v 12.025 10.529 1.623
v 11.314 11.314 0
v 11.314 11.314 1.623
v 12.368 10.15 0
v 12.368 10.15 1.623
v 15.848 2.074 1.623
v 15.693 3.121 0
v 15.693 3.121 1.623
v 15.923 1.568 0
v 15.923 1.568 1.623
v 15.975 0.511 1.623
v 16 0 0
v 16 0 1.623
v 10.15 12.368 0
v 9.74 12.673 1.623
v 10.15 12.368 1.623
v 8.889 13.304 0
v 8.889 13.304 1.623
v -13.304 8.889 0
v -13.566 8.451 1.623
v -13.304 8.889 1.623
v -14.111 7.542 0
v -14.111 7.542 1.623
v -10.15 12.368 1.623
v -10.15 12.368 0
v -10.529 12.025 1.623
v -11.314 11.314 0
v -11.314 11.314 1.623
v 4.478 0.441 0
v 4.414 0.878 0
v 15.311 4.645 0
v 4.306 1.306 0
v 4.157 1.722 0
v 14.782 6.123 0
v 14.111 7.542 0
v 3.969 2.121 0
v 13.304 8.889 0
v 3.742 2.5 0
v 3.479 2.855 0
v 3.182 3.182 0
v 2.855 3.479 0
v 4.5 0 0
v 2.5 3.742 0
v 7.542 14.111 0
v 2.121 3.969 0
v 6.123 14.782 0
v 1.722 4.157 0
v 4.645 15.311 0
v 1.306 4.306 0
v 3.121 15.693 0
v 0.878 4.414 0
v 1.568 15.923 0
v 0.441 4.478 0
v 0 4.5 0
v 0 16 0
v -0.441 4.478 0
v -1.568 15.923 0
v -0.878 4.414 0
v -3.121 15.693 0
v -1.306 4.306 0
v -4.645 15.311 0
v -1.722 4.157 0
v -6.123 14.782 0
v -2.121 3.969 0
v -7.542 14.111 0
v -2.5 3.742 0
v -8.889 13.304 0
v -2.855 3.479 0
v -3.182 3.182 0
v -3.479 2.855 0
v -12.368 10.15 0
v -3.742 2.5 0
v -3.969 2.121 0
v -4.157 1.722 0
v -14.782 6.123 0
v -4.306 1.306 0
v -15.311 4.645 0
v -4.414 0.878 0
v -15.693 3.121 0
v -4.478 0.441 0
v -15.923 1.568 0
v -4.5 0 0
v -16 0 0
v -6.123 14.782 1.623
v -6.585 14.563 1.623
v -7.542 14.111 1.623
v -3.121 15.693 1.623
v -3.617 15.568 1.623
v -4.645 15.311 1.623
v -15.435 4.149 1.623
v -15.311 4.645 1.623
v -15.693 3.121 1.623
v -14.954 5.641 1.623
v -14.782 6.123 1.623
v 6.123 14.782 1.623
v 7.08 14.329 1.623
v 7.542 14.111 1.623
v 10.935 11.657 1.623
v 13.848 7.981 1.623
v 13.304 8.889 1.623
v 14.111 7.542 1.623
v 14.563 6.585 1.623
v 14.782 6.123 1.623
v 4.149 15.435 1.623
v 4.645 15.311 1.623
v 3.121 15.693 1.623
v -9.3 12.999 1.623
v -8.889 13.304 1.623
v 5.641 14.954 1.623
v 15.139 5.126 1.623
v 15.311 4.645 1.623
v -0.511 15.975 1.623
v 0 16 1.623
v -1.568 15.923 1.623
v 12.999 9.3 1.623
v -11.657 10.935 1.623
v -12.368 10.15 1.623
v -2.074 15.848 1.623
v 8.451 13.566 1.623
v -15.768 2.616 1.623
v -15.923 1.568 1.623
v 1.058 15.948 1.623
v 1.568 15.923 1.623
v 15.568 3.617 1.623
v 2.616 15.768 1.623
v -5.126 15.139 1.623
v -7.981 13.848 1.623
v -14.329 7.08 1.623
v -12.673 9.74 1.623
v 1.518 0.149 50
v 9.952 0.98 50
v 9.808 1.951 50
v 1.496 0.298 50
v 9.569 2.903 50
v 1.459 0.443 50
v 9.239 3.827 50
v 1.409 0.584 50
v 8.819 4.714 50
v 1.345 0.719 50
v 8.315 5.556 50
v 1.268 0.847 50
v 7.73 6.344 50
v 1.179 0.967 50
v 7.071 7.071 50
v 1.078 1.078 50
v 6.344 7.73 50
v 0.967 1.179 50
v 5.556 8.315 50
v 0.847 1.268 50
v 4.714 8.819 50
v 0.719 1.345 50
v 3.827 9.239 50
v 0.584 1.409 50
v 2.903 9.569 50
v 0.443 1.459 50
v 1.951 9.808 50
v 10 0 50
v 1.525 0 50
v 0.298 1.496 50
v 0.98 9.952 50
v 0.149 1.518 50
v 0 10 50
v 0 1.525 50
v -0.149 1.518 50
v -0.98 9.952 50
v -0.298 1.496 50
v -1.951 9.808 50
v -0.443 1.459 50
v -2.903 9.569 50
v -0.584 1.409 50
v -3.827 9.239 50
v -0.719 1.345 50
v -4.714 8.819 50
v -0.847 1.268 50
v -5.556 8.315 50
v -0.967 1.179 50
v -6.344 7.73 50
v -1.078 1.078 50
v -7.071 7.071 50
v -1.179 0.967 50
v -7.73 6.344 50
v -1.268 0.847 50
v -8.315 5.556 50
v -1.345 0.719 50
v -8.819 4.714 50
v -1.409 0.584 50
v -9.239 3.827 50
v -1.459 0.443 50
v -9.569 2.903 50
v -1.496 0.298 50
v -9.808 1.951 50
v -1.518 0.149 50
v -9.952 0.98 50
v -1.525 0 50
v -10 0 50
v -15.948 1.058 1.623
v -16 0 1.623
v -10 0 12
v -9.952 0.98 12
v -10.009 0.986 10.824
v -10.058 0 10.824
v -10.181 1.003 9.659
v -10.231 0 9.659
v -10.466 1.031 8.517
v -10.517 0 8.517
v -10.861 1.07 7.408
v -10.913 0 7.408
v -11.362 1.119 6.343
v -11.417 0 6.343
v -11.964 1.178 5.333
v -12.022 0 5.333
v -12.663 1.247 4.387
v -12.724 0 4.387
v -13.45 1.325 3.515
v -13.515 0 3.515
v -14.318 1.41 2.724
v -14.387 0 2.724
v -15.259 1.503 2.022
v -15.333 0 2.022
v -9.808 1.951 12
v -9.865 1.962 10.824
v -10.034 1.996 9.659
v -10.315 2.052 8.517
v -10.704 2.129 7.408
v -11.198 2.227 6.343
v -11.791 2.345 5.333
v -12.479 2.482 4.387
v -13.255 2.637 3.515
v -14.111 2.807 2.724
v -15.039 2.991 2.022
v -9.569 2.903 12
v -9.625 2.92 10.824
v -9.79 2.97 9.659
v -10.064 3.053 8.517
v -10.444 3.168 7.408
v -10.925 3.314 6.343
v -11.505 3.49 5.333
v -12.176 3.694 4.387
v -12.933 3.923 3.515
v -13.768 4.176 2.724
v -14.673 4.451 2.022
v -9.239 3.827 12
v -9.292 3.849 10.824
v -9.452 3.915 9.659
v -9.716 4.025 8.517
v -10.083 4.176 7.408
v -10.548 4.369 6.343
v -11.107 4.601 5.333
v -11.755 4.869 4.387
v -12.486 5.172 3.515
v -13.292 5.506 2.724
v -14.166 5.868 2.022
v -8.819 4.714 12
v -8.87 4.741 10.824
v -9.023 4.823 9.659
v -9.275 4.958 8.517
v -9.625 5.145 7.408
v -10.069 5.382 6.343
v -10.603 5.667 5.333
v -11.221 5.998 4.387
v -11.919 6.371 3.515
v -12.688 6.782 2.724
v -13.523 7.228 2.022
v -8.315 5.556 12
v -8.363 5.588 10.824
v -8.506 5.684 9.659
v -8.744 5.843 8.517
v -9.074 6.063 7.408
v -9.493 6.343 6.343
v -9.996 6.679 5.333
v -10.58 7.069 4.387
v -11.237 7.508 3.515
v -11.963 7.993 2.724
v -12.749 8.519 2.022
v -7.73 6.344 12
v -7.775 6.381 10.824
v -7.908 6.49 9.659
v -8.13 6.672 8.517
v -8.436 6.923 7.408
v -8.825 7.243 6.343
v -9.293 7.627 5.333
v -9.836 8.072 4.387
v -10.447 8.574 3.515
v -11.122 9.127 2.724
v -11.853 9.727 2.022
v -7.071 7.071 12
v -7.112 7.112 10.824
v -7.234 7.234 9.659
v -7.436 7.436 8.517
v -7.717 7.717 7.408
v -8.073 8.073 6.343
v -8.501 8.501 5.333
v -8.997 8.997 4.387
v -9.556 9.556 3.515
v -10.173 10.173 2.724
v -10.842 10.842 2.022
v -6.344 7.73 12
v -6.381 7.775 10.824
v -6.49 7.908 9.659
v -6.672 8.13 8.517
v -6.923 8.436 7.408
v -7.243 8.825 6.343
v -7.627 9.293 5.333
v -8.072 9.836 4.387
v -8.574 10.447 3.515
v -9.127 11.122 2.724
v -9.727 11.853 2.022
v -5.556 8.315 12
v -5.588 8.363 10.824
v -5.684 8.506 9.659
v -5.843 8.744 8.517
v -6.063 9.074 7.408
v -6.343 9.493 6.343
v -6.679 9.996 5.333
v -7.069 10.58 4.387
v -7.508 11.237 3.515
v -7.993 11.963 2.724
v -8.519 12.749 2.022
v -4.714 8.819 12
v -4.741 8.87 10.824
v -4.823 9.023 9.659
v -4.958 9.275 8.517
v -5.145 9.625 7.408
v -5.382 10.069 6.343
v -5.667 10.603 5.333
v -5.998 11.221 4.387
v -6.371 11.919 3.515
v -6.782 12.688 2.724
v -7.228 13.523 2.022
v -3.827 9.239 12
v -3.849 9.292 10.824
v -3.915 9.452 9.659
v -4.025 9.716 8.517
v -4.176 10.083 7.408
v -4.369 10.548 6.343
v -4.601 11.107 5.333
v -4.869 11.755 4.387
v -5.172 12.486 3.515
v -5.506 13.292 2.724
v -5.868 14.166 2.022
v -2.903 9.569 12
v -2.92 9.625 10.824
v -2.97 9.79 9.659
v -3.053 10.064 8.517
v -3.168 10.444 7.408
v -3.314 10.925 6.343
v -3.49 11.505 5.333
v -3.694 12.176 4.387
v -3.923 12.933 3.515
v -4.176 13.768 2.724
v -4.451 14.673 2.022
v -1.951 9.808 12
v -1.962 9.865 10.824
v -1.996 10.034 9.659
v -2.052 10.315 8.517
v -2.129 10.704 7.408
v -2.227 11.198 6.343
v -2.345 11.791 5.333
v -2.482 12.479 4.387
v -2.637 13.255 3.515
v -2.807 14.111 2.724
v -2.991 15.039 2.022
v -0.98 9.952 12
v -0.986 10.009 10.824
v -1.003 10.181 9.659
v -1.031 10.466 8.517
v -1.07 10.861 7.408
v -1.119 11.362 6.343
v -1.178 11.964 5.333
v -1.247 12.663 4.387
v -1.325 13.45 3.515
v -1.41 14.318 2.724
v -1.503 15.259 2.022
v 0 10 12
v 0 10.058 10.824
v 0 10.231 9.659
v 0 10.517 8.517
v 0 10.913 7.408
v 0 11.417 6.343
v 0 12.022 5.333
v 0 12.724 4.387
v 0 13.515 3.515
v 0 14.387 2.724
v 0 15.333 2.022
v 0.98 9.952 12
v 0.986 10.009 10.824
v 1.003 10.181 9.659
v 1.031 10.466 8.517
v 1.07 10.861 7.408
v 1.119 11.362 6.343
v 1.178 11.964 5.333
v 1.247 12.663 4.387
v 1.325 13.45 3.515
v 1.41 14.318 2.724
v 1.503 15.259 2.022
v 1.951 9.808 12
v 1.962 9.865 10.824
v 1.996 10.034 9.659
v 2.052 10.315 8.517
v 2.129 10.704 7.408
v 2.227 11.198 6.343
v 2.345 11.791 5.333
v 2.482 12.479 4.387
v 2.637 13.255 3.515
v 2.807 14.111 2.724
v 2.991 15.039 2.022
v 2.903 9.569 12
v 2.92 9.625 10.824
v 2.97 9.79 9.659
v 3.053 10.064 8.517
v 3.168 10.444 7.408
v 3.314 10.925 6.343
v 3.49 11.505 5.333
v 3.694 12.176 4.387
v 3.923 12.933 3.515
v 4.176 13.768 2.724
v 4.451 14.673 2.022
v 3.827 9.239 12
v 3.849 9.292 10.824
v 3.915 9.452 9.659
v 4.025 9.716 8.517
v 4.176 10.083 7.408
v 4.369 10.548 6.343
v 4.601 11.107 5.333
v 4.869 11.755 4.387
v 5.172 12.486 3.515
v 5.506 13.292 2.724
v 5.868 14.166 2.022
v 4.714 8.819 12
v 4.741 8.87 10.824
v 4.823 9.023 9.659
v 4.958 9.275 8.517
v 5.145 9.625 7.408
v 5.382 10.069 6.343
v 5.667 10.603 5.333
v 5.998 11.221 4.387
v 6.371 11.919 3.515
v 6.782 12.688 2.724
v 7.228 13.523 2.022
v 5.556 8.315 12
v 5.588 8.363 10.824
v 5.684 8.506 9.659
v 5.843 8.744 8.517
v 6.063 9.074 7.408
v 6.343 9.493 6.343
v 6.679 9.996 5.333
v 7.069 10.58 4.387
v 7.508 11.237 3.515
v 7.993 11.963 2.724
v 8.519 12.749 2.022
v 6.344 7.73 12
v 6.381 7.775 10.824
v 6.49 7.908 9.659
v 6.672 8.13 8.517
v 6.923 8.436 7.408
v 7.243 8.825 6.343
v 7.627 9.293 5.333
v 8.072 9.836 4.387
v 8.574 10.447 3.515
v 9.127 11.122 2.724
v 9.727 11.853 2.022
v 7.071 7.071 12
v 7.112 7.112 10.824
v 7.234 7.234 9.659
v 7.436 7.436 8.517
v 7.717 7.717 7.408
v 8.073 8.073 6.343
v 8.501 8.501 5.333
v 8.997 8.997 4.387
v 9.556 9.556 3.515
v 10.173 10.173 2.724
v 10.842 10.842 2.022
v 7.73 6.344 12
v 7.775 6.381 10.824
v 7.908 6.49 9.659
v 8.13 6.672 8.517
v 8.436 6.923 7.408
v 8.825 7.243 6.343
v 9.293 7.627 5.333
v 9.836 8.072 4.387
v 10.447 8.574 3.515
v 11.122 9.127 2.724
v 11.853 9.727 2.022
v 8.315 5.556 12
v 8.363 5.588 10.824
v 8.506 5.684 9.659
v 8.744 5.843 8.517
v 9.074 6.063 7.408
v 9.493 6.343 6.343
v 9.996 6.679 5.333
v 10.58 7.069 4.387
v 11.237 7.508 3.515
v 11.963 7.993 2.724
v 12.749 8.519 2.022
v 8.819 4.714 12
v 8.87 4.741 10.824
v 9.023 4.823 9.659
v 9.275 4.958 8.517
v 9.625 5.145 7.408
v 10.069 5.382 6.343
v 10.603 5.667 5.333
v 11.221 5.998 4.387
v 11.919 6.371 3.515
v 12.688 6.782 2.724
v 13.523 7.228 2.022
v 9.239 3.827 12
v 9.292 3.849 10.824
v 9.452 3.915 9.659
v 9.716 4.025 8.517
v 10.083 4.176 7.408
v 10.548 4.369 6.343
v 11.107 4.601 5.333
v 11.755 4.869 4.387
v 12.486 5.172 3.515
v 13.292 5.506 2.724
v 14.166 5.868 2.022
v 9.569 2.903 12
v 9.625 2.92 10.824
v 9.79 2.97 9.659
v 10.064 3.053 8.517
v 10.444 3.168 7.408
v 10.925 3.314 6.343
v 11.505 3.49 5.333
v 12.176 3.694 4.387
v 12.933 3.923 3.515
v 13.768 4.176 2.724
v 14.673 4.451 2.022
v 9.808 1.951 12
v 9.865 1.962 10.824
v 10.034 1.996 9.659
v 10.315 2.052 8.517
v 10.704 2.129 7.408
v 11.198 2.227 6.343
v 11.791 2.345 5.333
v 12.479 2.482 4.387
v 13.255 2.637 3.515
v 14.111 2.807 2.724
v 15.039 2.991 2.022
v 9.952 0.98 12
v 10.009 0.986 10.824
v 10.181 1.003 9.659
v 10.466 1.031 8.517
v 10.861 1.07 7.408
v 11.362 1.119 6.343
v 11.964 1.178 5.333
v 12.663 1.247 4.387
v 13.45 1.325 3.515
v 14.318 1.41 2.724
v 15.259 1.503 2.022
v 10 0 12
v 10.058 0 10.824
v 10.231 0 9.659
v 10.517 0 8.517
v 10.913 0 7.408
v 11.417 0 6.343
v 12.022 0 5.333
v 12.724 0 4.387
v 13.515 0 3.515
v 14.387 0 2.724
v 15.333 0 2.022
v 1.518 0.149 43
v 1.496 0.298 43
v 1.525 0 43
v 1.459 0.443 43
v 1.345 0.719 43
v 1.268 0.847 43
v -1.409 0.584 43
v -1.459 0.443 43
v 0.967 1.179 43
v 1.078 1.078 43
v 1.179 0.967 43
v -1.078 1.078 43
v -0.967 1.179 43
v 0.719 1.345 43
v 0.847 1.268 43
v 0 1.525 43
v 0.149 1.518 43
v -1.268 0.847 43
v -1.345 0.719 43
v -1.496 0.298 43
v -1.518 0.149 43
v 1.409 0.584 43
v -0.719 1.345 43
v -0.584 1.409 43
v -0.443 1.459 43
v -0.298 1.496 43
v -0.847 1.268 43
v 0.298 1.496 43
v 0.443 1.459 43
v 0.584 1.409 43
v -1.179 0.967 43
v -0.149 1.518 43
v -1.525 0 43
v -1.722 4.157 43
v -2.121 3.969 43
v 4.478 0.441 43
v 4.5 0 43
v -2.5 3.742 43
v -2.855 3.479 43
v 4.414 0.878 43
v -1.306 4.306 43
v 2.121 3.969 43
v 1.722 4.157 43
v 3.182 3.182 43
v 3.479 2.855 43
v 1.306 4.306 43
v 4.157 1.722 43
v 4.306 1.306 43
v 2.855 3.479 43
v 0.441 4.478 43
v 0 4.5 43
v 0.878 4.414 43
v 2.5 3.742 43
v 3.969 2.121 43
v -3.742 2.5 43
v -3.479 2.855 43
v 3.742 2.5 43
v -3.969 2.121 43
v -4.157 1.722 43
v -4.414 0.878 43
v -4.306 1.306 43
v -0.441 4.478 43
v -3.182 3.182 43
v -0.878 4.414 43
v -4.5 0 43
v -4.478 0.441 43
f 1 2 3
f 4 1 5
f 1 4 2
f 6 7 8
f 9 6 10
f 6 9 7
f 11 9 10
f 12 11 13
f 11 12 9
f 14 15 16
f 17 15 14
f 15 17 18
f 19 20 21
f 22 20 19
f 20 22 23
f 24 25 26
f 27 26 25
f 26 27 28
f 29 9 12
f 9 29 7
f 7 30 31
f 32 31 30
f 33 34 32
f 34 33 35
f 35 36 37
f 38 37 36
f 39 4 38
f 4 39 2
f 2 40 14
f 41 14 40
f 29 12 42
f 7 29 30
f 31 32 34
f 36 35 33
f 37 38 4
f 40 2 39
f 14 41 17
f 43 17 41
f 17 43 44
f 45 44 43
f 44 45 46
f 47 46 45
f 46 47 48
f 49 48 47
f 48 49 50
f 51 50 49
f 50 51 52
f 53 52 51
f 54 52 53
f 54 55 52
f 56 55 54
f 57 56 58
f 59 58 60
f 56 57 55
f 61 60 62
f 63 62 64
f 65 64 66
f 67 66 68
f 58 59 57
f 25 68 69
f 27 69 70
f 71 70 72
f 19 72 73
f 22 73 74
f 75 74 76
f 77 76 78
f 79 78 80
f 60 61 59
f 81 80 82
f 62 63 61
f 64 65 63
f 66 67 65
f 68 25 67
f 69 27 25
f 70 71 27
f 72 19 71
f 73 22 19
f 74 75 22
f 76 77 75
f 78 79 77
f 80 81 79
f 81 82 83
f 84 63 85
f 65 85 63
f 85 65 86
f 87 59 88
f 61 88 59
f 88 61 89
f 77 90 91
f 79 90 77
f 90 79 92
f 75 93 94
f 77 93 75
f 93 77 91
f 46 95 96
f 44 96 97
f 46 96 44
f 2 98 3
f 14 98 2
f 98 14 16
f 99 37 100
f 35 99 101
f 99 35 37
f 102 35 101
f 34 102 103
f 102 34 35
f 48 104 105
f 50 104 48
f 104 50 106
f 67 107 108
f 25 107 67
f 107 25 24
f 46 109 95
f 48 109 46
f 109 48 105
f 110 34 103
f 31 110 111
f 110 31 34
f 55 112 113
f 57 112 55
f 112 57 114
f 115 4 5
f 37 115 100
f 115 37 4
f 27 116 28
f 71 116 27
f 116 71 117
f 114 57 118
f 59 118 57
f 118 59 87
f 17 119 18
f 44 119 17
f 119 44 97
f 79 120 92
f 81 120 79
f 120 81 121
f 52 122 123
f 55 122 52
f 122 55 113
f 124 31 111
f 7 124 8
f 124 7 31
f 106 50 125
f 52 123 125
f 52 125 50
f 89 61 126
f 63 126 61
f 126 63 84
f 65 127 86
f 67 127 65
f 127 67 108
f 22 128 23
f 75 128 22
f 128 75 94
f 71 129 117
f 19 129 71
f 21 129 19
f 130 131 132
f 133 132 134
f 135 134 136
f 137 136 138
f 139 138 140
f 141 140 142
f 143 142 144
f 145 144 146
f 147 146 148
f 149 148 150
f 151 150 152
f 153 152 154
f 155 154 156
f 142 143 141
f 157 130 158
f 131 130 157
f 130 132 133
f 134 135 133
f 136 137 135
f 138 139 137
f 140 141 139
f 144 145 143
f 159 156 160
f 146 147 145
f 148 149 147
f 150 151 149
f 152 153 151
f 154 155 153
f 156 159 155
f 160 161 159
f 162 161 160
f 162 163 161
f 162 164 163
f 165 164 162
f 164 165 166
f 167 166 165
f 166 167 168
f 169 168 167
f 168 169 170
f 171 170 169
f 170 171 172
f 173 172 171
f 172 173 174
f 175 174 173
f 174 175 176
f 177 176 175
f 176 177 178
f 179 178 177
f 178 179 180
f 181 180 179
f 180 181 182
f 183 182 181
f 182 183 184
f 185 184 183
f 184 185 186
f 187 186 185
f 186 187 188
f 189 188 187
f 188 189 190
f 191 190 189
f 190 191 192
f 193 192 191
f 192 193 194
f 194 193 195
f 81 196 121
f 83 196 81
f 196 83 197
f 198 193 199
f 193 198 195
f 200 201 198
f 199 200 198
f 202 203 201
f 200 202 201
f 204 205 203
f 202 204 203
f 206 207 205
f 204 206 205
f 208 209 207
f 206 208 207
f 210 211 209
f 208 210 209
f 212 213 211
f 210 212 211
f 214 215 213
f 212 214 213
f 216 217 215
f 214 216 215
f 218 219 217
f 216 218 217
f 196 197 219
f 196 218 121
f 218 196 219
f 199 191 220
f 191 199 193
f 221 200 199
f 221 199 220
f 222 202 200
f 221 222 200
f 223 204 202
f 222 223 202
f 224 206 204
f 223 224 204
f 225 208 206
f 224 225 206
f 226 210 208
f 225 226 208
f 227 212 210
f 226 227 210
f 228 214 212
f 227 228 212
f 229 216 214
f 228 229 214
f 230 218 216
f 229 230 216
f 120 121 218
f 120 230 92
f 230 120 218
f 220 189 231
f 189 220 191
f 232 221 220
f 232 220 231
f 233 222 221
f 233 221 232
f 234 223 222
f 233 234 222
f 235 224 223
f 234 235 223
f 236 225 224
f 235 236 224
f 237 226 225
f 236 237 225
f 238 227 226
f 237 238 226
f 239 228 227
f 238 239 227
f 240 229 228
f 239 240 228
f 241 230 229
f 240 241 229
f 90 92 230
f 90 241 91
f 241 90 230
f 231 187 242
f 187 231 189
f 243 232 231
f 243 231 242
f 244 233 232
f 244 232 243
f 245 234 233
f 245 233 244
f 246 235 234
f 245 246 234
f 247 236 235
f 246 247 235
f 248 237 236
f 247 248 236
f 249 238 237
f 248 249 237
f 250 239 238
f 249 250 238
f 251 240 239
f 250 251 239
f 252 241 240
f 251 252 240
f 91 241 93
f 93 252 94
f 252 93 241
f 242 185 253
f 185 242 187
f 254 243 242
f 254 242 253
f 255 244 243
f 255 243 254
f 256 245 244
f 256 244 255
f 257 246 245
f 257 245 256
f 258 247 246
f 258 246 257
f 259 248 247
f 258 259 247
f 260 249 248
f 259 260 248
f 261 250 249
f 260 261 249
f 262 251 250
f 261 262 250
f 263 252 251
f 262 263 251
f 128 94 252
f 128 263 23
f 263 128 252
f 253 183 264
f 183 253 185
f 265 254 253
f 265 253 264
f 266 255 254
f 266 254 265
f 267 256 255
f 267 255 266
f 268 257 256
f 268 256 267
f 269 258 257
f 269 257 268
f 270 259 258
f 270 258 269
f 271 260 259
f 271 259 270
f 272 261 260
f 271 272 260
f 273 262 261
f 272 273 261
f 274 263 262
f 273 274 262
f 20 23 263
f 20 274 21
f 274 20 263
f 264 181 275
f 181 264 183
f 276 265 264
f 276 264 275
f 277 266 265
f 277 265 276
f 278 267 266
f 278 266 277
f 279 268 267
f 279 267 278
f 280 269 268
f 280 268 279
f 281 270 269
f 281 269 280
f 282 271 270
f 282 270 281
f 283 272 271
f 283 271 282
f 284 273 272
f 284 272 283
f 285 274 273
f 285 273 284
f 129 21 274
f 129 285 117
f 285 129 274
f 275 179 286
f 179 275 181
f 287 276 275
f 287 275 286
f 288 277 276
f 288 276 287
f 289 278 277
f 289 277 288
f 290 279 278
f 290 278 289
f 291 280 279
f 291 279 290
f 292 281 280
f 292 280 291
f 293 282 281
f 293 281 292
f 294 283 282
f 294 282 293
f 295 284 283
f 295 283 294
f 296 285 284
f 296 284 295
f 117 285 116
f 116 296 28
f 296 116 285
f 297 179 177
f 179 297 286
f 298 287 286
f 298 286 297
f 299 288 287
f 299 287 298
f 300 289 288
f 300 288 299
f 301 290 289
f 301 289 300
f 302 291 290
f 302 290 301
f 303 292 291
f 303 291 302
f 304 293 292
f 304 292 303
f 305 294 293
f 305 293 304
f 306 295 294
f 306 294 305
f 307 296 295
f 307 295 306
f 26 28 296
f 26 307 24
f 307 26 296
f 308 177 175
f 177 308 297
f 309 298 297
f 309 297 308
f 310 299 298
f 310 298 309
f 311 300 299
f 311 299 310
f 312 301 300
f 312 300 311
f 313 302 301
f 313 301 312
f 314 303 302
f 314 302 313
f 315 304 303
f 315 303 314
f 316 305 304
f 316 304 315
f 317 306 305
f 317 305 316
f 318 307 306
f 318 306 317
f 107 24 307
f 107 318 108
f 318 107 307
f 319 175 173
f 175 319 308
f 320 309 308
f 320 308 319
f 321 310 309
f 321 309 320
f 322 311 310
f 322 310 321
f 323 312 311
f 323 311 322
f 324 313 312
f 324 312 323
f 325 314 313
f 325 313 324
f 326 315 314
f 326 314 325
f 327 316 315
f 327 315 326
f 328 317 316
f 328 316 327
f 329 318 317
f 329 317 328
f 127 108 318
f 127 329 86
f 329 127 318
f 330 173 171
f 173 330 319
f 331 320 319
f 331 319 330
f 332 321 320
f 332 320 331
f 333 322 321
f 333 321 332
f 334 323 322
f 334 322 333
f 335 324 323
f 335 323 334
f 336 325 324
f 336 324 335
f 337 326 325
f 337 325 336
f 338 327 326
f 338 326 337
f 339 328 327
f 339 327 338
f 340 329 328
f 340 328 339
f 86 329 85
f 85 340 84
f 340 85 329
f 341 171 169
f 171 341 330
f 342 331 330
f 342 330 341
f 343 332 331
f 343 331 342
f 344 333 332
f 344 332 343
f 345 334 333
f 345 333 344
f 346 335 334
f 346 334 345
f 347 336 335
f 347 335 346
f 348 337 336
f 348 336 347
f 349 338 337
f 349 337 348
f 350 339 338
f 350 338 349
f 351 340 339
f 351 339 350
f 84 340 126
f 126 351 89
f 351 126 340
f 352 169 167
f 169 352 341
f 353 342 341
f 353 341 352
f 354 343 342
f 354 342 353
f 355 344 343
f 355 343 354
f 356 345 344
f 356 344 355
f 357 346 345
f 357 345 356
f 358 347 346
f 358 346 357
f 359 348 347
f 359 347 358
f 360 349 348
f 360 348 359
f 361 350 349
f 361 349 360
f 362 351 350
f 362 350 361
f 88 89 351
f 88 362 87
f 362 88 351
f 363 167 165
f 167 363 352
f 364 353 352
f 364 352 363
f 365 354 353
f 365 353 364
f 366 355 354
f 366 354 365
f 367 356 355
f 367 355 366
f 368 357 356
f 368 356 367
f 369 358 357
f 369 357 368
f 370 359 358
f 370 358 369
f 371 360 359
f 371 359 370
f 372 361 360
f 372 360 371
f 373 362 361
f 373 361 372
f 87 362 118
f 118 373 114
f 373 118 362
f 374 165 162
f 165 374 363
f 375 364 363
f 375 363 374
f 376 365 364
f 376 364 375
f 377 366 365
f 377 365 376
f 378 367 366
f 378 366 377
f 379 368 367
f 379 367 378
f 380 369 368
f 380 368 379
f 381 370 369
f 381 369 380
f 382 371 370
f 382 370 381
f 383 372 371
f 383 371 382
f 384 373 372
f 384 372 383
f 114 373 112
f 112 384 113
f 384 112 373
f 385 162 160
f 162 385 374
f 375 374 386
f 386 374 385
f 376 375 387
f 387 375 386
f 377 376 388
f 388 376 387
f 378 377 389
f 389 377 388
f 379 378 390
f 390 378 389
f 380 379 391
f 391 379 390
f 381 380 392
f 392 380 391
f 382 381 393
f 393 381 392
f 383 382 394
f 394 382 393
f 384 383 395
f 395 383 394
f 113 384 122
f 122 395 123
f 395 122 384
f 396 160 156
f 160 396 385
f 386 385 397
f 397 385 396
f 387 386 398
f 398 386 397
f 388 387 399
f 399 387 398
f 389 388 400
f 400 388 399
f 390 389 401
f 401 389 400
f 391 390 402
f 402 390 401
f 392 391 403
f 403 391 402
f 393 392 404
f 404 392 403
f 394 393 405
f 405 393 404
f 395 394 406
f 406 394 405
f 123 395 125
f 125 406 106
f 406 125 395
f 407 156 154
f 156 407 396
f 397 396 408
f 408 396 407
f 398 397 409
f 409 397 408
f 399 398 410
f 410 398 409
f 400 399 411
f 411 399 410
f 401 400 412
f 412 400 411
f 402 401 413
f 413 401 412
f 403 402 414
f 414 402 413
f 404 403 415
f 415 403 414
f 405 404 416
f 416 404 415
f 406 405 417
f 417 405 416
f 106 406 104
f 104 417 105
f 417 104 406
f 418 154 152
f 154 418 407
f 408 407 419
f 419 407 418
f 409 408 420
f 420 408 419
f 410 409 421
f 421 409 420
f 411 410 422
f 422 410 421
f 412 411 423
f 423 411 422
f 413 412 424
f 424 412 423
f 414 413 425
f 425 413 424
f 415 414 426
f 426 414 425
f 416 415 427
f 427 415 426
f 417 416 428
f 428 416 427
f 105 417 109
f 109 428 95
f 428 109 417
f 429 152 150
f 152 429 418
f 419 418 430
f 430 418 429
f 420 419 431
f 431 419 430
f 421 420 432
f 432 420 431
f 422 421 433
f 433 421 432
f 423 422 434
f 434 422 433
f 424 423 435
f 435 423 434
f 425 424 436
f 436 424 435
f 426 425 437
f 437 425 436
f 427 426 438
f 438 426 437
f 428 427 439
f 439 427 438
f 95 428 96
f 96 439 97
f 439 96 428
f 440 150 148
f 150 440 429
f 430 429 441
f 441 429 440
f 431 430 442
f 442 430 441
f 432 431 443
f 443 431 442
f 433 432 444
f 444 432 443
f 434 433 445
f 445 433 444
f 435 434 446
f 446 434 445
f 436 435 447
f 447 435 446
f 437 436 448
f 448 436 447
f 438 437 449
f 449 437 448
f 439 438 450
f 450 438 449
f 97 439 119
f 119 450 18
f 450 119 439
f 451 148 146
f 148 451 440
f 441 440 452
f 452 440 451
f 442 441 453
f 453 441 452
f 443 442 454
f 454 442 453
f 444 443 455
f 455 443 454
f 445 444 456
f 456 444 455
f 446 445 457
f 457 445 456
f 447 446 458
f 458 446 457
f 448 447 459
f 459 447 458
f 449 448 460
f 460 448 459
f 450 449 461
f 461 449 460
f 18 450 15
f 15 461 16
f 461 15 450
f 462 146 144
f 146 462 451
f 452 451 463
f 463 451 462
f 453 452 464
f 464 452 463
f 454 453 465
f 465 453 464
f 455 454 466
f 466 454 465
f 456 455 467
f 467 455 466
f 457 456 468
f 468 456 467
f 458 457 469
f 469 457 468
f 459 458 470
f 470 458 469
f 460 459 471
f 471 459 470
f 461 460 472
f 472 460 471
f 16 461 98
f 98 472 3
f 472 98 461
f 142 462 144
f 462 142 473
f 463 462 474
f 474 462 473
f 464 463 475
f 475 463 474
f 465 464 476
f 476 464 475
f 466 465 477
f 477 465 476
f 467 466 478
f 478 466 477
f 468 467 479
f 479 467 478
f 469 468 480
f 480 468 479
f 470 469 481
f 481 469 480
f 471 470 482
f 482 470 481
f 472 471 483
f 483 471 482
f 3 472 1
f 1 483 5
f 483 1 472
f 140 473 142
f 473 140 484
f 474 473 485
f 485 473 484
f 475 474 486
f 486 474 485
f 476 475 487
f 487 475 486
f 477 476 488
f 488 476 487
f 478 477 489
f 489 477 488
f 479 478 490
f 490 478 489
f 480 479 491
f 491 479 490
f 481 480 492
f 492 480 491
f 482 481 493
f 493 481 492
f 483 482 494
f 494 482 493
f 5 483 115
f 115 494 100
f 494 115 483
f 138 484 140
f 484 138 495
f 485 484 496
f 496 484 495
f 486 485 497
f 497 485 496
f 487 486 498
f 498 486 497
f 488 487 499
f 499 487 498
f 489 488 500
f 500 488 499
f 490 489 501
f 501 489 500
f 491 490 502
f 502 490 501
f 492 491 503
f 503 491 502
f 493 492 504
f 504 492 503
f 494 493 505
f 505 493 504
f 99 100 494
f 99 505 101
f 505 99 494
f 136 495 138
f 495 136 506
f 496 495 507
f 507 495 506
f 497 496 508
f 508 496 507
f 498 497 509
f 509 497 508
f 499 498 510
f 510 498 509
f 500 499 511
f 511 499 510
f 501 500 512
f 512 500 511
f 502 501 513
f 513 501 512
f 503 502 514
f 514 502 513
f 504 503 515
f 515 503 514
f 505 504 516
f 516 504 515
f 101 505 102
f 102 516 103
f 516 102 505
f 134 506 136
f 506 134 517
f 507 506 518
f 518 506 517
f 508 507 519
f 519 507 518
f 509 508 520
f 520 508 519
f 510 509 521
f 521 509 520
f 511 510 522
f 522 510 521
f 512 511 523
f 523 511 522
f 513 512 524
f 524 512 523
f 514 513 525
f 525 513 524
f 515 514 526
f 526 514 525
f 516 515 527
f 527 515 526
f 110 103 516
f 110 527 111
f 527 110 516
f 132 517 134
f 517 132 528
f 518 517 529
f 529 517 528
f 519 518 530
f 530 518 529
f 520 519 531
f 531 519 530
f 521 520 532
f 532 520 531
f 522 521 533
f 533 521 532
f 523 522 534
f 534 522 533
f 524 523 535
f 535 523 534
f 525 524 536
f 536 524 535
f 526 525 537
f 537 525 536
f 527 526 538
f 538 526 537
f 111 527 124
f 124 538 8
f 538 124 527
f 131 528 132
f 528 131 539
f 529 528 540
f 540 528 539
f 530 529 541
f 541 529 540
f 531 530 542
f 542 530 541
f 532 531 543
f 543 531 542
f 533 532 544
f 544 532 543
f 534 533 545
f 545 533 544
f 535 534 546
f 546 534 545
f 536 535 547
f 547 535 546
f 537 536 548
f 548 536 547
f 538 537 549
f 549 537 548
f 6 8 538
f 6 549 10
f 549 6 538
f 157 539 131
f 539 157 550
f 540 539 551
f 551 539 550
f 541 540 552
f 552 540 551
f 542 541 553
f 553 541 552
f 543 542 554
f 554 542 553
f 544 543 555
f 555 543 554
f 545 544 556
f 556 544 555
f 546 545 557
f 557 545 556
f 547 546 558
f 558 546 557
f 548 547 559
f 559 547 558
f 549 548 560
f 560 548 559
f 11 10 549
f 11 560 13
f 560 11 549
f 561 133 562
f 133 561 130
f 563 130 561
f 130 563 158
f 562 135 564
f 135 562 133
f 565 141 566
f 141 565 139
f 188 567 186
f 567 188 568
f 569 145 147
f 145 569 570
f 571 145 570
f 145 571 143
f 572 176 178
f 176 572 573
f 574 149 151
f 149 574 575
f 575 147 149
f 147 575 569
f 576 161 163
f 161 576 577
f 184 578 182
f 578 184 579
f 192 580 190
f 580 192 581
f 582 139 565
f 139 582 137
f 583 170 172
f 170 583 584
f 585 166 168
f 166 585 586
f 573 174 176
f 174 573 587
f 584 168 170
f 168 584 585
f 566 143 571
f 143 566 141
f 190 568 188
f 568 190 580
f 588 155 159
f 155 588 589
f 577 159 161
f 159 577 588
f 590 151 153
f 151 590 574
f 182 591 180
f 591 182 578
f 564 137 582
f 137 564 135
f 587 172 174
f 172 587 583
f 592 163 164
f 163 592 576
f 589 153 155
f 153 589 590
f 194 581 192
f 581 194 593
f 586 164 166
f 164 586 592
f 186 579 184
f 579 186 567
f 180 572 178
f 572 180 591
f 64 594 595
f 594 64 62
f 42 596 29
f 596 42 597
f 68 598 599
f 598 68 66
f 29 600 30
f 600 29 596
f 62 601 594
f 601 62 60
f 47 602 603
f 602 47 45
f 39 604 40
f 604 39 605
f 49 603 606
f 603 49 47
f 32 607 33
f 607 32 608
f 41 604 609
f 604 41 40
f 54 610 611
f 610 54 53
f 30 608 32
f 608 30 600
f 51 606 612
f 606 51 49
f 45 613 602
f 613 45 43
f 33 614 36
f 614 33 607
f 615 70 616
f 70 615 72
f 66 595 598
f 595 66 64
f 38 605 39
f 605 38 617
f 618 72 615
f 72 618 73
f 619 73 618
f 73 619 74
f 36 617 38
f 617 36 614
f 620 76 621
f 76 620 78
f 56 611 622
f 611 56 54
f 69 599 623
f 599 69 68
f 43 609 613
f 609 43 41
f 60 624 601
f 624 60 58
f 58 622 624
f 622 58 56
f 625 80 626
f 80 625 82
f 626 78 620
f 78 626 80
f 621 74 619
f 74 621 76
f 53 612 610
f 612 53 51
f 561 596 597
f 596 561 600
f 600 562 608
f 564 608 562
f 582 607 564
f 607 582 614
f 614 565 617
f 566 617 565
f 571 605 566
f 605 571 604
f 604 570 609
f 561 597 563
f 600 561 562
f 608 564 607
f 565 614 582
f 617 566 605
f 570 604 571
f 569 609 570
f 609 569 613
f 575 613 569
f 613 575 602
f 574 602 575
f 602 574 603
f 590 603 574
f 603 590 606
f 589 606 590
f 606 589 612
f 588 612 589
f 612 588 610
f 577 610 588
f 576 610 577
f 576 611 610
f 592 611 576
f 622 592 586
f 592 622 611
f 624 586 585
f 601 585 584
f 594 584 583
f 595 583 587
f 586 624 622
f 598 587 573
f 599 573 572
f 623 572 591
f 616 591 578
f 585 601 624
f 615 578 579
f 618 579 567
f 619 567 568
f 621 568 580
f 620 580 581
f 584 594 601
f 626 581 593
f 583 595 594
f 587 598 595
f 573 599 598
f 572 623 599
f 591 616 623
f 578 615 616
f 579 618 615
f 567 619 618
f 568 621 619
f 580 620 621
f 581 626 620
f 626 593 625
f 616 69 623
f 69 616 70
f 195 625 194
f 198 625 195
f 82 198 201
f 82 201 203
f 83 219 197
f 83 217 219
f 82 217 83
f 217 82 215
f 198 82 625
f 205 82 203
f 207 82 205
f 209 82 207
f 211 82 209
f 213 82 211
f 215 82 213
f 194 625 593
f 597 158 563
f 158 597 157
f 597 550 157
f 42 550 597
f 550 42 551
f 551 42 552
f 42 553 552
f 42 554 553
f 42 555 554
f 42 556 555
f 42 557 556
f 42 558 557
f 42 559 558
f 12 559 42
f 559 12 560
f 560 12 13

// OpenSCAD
//---------------------------------------------------------------
//-- Openscad Pillar used in Cool PCB Enclosure (http://www.thingiverse.com/thing:1665075).
//-- This is a simple pillar used to close the shields together with a screw, washers and a nut.
//-- Version: 1.0
//-- Jul-2016
//---------------------------------------------------------------
//-- Released under the GPL3 license
//---------------------------------------------------------------

//---------------------------------------------------------------
//-- CUSTOMIZER PARAMETERS
//---------------------------------------------------------------


// - Pillar height
Pillar_Height = 50;
// - Pillar external diameter
Pillar_ext_dia = 20;
// - Pillar internal diameter
Pillar_int_dia = 3.05; // M3
// - Pillar base hole diameter
Pillar_bh_dia = 9;
// - Pillar Fillet
Pillar_Fillet = 12;
// - Pillar top thickness
Pillar_top_thick = 7;


Pillar_bh_height = Pillar_Height - Pillar_top_thick;


//---------------------------------------------------------------
//-- MODULES
//---------------------------------------------------------------



module Bpillar(pillar_height, ext_diameter, int_diameter, base_hole_diameter, base_hole_height, pillar_Fillet){
    translate([0, 0, 0])
     difference() {
        cylinder(d = ext_diameter + pillar_Fillet, h = pillar_height, $fn=64);
        rotate_extrude($fn = 64) {
          translate([(ext_diameter + pillar_Fillet * 2)/2, pillar_Fillet, 0]) {
            minkowski(){
              square(pillar_height);
              circle(pillar_Fillet, $fn=64);
            }
          }
        }
    cylinder(d = int_diameter, h = pillar_height, $fn = 64);
    color("red") 
      translate([0, 0, 0])
        cylinder(d = base_hole_diameter, h = base_hole_height, $fn = 64);
    }
} 



//---------------------------------------------------------------
//-- RENDERS
//---------------------------------------------------------------


difference() {
Bpillar(pillar_height = Pillar_Height, ext_diameter = Pillar_ext_dia, int_diameter = Pillar_int_dia, base_hole_diameter = Pillar_bh_dia, base_hole_height = Pillar_bh_height, pillar_Fillet = Pillar_Fillet);    
translate([0, -50, 0]) cube([100, 100, 100], center = true);
}
